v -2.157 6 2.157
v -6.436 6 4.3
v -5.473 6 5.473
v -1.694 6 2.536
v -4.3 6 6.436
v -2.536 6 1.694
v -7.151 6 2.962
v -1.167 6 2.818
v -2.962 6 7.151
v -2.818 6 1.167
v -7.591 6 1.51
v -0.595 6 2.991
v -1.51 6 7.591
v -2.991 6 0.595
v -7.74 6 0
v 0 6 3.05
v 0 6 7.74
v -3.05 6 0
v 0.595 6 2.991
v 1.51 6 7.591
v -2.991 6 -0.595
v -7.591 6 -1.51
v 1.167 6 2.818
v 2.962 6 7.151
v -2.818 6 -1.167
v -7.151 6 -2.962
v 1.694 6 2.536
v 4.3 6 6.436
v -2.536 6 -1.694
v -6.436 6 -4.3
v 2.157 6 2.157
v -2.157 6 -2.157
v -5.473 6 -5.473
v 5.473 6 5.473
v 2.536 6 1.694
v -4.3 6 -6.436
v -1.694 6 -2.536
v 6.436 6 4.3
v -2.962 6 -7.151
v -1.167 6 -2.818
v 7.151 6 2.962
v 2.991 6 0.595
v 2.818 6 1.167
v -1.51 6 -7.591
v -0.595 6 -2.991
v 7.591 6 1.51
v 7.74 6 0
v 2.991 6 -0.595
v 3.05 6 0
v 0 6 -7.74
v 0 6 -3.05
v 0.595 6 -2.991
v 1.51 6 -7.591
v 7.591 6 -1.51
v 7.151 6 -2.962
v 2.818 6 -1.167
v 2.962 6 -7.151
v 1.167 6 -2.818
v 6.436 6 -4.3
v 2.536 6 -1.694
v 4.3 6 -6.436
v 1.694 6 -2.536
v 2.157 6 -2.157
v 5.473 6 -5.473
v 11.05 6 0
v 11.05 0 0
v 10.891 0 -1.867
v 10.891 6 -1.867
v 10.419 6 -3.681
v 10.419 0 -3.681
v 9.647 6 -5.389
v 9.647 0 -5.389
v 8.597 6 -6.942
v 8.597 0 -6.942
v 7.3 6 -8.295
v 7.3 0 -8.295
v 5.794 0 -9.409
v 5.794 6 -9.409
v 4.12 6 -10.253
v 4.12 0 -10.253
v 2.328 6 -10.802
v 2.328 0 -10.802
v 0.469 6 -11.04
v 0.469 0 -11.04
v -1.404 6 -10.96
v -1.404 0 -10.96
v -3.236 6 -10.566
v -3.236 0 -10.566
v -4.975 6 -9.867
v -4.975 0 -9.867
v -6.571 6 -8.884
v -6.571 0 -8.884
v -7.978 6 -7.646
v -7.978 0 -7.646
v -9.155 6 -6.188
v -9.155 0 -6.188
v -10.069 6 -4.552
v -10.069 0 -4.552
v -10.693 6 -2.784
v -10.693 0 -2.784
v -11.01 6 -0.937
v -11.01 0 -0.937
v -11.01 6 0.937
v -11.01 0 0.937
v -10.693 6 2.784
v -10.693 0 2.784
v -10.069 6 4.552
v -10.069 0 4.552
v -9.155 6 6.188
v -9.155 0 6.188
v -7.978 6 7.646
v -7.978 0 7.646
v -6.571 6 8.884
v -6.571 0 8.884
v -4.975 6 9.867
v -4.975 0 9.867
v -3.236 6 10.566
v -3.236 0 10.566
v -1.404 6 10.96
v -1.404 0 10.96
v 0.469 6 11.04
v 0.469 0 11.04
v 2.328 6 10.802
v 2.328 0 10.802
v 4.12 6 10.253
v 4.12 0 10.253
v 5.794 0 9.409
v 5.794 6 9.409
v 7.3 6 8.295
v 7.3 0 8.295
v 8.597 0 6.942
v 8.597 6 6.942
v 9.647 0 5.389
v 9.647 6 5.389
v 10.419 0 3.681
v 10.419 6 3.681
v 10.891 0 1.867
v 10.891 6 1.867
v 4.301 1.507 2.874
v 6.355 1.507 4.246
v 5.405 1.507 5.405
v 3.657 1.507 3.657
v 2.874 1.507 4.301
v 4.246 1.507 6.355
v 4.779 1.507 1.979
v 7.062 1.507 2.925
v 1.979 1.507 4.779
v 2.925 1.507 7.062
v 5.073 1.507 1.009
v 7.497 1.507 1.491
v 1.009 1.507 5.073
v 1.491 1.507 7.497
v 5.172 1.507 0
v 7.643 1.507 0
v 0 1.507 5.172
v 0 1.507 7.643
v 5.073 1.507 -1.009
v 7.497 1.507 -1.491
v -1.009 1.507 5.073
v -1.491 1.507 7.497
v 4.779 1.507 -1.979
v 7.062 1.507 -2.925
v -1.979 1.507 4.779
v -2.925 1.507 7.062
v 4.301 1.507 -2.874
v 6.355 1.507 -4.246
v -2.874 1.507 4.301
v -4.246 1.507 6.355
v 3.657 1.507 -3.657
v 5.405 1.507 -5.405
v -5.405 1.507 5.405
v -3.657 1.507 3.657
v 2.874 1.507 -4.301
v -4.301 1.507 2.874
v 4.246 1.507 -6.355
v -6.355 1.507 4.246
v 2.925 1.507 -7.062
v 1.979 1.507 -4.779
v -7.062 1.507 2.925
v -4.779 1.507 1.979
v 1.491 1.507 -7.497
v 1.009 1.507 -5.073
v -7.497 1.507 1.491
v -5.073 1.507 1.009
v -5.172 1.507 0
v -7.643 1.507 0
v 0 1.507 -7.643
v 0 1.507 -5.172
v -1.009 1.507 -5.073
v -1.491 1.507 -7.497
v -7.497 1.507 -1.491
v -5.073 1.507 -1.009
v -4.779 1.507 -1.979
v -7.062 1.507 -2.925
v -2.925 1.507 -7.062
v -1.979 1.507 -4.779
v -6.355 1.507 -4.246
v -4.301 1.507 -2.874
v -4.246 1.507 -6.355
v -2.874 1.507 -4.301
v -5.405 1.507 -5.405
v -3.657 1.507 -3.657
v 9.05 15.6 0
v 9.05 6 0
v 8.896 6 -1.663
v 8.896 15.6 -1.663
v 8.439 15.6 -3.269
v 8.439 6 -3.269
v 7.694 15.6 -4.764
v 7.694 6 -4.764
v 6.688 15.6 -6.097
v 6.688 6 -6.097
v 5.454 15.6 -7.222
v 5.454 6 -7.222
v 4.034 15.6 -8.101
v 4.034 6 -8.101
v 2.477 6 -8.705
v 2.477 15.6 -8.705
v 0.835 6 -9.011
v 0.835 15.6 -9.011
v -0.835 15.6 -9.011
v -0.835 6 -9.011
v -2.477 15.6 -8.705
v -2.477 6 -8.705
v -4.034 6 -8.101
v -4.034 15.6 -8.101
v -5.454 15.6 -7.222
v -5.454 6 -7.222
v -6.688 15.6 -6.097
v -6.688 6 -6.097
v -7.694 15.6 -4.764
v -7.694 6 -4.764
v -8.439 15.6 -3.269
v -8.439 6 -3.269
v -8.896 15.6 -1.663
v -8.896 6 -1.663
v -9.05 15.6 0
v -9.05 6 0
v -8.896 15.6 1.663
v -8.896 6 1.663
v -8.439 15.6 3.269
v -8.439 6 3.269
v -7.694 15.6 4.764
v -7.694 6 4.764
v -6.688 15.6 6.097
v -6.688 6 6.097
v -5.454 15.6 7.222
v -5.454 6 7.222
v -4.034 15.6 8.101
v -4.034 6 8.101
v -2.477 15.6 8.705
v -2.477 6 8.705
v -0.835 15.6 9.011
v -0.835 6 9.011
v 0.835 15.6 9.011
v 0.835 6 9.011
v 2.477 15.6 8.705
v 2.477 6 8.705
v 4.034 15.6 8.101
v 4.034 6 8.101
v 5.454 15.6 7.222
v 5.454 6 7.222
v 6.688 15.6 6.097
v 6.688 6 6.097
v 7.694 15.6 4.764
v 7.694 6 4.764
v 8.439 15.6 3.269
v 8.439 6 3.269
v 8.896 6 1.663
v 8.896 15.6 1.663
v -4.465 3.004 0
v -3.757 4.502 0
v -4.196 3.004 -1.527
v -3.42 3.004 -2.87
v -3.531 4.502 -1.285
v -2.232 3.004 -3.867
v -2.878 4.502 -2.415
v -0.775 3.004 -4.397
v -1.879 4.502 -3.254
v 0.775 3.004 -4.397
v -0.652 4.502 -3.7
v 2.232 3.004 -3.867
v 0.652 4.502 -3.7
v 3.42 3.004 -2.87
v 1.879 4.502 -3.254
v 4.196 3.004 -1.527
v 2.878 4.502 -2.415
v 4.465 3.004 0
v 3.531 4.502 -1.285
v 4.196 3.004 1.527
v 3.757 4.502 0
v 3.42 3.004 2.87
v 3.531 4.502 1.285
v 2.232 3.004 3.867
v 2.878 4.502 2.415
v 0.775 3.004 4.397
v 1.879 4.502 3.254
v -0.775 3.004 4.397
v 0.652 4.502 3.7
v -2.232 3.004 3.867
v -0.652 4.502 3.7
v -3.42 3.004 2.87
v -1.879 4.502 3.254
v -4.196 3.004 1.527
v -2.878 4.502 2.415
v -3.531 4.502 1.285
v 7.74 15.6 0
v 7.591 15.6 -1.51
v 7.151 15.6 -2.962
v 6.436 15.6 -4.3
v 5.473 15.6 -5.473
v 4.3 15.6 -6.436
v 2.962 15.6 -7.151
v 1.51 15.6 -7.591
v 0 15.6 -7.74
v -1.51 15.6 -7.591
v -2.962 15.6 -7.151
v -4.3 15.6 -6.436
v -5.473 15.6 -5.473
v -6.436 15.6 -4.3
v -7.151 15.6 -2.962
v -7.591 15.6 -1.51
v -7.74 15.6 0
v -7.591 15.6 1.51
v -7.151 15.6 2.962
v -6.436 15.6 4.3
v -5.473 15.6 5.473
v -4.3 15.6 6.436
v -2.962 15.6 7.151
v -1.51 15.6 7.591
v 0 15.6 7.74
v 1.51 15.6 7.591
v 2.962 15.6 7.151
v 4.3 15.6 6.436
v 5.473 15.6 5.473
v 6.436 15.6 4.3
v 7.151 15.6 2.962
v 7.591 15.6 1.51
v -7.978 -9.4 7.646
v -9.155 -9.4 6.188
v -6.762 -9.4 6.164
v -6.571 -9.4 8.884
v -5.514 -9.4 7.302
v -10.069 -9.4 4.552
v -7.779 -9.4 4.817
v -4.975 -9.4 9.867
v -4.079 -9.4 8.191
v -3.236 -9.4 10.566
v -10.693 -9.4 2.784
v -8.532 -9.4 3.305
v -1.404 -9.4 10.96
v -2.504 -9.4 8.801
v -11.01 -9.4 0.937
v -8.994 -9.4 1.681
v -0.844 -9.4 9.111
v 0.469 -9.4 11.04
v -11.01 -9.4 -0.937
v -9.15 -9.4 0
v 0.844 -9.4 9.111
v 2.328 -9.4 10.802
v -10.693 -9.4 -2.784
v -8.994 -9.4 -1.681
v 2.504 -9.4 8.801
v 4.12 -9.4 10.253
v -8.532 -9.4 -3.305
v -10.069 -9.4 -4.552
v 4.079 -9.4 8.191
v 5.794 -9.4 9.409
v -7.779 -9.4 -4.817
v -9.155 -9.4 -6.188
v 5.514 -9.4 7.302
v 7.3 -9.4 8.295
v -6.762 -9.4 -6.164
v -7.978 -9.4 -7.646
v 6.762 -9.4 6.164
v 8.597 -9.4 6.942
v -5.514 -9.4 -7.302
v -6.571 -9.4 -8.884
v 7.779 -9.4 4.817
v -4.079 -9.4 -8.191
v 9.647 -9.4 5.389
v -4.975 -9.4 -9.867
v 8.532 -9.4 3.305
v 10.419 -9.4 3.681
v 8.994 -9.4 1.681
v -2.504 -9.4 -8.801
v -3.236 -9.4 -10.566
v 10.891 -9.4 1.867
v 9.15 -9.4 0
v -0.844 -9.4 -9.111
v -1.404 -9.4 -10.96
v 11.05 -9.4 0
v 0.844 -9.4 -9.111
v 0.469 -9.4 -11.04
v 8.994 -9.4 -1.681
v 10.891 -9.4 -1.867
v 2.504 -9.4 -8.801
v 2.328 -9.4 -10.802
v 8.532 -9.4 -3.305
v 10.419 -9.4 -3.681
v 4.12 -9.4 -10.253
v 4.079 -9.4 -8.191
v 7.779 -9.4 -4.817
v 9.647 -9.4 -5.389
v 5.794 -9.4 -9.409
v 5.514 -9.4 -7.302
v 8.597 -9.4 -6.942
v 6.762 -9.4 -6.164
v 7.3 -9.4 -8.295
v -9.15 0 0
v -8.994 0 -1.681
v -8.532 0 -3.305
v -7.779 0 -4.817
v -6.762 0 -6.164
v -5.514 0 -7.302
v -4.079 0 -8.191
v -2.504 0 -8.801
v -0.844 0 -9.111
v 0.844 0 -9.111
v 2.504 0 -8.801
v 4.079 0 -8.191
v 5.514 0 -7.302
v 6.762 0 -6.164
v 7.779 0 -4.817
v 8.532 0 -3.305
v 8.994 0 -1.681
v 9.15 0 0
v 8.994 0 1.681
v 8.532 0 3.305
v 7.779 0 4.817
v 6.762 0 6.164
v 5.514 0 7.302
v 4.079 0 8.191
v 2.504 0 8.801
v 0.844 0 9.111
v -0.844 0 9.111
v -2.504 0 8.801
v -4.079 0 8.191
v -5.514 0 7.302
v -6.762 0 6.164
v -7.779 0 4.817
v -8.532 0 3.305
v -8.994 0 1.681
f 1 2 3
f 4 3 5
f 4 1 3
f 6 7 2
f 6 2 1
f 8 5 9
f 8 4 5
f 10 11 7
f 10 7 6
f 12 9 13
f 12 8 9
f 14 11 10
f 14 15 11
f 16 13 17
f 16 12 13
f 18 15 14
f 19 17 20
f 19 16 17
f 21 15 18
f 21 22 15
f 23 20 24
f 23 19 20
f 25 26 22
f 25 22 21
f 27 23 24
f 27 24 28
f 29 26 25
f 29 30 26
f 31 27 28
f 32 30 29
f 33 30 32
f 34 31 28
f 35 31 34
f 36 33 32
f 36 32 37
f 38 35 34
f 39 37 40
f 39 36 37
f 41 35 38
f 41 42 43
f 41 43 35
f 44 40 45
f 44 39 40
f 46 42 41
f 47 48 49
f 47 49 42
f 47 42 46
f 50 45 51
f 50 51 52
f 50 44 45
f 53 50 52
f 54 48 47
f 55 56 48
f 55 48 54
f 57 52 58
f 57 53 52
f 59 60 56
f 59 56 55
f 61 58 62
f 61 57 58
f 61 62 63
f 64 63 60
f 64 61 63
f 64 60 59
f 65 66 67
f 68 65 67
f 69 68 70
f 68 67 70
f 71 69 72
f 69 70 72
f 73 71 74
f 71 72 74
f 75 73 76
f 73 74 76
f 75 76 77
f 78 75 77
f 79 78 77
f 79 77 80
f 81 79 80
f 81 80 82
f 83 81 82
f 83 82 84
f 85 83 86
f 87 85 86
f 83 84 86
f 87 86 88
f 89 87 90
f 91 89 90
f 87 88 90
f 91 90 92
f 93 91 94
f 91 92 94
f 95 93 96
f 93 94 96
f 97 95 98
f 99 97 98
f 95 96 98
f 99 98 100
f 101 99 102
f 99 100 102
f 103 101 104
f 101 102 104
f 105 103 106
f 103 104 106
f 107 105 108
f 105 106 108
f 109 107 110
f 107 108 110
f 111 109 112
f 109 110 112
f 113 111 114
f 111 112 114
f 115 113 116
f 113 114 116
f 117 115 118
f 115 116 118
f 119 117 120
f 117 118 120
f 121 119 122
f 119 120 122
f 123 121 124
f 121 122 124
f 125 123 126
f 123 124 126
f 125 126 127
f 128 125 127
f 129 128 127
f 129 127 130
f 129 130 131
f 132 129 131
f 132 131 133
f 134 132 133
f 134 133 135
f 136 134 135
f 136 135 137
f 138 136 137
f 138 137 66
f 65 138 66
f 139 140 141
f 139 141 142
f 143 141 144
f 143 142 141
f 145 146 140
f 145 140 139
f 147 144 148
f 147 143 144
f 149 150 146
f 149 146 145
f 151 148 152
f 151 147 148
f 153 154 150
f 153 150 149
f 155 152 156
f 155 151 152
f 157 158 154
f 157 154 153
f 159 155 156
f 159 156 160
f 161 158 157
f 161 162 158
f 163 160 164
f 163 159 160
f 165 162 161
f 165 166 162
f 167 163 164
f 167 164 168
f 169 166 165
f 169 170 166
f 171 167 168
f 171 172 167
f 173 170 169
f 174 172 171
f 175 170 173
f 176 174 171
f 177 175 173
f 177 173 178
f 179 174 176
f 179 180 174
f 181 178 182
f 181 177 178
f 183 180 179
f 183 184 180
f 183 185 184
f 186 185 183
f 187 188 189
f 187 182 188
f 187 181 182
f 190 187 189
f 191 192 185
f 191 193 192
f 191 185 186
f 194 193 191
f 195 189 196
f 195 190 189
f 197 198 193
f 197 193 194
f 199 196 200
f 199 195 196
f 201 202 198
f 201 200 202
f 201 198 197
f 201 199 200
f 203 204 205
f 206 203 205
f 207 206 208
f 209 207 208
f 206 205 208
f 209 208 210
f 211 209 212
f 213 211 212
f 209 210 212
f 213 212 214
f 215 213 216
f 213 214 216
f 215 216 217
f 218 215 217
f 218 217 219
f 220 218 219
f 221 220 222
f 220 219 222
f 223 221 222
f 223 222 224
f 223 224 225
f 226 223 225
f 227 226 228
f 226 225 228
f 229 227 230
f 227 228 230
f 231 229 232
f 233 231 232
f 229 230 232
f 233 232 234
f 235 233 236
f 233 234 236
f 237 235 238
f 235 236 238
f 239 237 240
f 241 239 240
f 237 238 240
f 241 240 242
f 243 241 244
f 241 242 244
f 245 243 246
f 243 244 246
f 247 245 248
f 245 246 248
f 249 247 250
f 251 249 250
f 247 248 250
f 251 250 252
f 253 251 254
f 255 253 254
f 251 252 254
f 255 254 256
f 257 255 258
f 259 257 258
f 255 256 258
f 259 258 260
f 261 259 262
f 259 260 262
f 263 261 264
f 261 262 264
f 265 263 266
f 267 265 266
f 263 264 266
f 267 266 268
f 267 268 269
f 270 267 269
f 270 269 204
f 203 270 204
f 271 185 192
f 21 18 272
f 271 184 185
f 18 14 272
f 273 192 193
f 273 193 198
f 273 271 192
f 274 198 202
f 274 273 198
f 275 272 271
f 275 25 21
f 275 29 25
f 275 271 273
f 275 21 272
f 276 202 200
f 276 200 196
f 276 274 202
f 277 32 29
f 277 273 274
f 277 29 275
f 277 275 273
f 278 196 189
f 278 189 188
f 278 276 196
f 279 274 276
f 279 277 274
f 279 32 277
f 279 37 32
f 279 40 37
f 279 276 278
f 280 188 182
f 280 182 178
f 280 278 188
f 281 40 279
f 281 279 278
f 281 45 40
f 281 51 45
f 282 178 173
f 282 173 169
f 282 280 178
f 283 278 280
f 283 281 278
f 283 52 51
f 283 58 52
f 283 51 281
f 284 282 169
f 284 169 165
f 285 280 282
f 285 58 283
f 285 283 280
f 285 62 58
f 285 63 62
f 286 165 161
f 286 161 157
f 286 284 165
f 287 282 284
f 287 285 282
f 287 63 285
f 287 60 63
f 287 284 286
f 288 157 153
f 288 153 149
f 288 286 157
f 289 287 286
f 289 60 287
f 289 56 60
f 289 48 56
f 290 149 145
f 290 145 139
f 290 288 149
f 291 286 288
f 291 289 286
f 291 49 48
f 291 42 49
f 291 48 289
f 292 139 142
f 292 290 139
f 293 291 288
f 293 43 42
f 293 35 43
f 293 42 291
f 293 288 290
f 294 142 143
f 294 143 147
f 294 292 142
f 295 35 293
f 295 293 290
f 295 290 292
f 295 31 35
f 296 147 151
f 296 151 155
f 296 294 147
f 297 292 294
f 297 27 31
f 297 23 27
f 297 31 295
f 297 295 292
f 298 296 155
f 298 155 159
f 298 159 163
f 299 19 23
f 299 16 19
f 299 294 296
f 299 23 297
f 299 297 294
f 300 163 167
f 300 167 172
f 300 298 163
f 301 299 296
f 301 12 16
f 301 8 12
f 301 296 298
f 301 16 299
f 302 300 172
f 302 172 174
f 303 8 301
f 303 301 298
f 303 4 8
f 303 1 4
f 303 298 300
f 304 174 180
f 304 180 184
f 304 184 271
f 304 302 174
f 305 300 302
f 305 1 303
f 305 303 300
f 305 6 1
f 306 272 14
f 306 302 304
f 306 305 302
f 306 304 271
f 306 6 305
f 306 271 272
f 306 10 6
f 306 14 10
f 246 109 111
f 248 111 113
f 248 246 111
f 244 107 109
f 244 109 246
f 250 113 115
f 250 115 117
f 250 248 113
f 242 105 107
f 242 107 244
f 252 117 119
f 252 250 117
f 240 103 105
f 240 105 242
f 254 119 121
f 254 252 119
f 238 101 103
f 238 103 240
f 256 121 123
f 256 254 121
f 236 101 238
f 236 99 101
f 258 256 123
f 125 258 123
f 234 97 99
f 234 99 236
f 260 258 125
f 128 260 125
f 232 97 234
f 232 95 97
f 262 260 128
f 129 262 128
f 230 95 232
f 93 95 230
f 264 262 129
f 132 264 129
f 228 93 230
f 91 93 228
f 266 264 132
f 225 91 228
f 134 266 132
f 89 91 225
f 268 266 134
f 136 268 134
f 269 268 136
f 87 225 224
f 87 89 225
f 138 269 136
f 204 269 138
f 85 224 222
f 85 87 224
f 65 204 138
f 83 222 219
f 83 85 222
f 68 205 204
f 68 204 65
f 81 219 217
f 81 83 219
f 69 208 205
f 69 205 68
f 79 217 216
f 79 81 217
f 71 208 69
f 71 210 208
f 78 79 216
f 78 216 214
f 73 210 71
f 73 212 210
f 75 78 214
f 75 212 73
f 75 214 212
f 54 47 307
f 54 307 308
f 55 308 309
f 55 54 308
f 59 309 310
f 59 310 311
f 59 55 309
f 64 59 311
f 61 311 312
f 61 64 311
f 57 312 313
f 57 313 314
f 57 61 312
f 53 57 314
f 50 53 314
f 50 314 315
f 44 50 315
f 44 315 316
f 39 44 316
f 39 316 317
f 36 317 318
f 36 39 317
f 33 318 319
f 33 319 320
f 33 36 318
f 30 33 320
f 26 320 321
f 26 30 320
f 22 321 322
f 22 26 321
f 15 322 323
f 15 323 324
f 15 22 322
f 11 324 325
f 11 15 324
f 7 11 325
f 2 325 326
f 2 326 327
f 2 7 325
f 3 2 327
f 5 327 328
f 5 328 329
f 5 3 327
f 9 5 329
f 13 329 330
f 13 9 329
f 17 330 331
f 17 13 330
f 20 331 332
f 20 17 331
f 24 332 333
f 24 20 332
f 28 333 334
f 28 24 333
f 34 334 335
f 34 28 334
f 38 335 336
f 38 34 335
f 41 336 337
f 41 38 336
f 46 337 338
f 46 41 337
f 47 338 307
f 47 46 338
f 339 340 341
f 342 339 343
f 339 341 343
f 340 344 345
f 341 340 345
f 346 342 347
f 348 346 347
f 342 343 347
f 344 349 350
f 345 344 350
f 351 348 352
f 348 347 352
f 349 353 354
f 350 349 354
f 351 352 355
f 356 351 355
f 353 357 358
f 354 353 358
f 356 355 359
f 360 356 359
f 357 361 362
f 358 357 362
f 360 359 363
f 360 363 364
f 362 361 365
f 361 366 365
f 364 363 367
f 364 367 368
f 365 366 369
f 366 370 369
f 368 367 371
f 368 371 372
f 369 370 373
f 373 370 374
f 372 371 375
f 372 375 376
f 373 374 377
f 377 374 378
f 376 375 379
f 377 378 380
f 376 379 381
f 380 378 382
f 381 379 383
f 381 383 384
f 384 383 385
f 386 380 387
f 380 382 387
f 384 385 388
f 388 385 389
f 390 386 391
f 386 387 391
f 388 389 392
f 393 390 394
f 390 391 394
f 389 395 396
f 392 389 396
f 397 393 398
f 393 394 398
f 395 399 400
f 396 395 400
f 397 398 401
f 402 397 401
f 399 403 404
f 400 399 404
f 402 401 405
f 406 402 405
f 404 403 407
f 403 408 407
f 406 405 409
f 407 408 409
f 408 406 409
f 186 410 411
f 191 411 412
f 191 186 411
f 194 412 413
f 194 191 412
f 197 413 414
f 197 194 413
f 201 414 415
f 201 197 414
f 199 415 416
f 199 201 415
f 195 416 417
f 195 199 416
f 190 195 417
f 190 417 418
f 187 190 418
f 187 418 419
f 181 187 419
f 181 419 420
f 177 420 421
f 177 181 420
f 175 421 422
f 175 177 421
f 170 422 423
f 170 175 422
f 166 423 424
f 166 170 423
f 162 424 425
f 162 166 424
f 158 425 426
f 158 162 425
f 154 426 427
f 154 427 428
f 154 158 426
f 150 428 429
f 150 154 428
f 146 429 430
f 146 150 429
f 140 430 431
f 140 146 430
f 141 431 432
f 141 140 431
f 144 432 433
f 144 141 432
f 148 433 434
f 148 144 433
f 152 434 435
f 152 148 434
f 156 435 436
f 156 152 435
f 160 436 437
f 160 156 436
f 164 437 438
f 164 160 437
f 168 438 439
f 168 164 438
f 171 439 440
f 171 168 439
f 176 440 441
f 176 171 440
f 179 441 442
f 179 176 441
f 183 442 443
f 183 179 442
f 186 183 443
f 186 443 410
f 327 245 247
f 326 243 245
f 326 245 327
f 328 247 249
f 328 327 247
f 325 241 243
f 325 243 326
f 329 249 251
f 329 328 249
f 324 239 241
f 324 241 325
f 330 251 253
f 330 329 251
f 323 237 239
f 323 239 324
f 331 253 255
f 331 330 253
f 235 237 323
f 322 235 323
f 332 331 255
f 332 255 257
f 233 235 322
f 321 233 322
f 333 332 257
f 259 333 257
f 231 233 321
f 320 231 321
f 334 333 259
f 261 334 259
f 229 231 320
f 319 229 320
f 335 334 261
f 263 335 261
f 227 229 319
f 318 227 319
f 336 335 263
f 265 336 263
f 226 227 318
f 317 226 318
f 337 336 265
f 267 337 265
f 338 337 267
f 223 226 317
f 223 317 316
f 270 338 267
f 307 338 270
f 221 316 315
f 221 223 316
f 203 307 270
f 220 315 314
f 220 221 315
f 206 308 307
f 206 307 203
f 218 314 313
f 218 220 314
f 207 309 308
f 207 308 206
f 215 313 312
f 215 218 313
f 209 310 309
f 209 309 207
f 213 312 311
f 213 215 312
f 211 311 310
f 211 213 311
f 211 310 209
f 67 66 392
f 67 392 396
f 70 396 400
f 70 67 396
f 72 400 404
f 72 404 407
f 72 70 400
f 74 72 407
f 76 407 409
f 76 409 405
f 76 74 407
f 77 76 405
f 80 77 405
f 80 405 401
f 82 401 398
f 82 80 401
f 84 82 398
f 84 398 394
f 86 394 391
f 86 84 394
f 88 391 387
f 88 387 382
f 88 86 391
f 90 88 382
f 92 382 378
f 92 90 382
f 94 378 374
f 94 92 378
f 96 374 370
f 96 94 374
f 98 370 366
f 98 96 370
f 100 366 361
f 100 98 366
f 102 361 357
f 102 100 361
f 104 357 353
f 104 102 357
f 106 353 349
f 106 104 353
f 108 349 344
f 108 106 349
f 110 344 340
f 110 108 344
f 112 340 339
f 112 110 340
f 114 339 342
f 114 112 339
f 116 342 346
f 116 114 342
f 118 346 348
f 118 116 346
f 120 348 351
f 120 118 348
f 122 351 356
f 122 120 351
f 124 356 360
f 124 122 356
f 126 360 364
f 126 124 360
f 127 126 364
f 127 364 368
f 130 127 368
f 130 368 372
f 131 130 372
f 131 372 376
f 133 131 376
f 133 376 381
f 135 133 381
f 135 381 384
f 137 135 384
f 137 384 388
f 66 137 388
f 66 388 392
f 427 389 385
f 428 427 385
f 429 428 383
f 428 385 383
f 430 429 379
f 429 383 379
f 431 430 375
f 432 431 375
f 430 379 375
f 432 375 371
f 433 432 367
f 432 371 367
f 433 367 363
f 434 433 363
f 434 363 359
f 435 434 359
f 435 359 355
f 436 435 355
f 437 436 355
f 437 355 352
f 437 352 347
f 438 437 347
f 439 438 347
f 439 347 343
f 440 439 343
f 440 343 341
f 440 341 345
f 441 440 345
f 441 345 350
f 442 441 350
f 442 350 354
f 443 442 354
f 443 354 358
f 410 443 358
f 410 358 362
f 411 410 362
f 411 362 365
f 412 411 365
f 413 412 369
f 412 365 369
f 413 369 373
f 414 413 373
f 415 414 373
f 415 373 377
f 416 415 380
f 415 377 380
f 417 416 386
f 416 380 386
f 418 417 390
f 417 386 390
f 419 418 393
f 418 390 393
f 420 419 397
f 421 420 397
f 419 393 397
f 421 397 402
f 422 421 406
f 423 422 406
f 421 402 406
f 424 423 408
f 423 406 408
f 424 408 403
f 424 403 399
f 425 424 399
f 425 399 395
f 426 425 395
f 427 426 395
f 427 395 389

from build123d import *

# Parameters (mm, degrees)
CROQUIS1_R              = 11.05
CROQUIS1_R_2            = 9.05
SALIENTE_EXTRUIR1_DEPTH = 9.4
CROQUIS2_R              = 11.05
SALIENTE_EXTRUIR2_DEPTH = 6
CROQUIS3_R              = 9.05
CROQUIS3_R_2            = 7.74
SALIENTE_EXTRUIR3_DEPTH = 9.6
CROQUIS4_R              = 3.05
CORTAR_EXTRUIR1_DEPTH   = 9.6
CROQUIS5_R              = 9.15
CORTAR_EXTRUIR2_DEPTH   = 9.4


with BuildPart() as part:
    # Croquis1 → Saliente-Extruir1 (new body)
    with BuildSketch(Plane(origin=(0, 0, 0), x_dir=(1, 0, 0), z_dir=(0, 1, 0))):
        Circle(CROQUIS1_R)
        Circle(CROQUIS1_R_2, mode=Mode.SUBTRACT)
    extrude(amount=-SALIENTE_EXTRUIR1_DEPTH)

    # Croquis2 → Saliente-Extruir2 (add)
    with BuildSketch(Plane(origin=(0, 0, 0), x_dir=(1, 0, 0), z_dir=(0, 1, 0))):
        Circle(CROQUIS2_R)
    extrude(amount=SALIENTE_EXTRUIR2_DEPTH)

    # Croquis3 → Saliente-Extruir3 (add)
    with BuildSketch(Plane(origin=(0, 6, 0), x_dir=(1, 0, 0), z_dir=(0, 1, 0))):
        Circle(CROQUIS3_R)
        Circle(CROQUIS3_R_2, mode=Mode.SUBTRACT)
    extrude(amount=SALIENTE_EXTRUIR3_DEPTH)

    # Croquis4 → Cortar-Extruir1 (cut)
    with BuildSketch(Plane(origin=(0, 6, 0), x_dir=(1, 0, 0), z_dir=(0, 1, 0))):
        Circle(CROQUIS4_R)
    extrude(amount=-CORTAR_EXTRUIR1_DEPTH, mode=Mode.SUBTRACT)

    # Croquis5 → Cortar-Extruir2 (cut)
    with BuildSketch(Plane.XZ.offset(9.4)):
        Circle(CROQUIS5_R)
    extrude(amount=-CORTAR_EXTRUIR2_DEPTH, mode=Mode.SUBTRACT)

    # Croquis6 → Cortar-Revolución1 (revolve, cut)
    with BuildSketch(Plane.XY):
        Polygon((-9.15, 0), (-7.643411501, 1.506588499), (-5.172223625, 1.506588499), (-3.05, 6), (0, 6), (0, 1.506588499), (0, 0), align=None)
    revolve(axis=Axis((0, 1.506588499, 0), (0, -1, 0)), mode=Mode.SUBTRACT)


solid = part.part
